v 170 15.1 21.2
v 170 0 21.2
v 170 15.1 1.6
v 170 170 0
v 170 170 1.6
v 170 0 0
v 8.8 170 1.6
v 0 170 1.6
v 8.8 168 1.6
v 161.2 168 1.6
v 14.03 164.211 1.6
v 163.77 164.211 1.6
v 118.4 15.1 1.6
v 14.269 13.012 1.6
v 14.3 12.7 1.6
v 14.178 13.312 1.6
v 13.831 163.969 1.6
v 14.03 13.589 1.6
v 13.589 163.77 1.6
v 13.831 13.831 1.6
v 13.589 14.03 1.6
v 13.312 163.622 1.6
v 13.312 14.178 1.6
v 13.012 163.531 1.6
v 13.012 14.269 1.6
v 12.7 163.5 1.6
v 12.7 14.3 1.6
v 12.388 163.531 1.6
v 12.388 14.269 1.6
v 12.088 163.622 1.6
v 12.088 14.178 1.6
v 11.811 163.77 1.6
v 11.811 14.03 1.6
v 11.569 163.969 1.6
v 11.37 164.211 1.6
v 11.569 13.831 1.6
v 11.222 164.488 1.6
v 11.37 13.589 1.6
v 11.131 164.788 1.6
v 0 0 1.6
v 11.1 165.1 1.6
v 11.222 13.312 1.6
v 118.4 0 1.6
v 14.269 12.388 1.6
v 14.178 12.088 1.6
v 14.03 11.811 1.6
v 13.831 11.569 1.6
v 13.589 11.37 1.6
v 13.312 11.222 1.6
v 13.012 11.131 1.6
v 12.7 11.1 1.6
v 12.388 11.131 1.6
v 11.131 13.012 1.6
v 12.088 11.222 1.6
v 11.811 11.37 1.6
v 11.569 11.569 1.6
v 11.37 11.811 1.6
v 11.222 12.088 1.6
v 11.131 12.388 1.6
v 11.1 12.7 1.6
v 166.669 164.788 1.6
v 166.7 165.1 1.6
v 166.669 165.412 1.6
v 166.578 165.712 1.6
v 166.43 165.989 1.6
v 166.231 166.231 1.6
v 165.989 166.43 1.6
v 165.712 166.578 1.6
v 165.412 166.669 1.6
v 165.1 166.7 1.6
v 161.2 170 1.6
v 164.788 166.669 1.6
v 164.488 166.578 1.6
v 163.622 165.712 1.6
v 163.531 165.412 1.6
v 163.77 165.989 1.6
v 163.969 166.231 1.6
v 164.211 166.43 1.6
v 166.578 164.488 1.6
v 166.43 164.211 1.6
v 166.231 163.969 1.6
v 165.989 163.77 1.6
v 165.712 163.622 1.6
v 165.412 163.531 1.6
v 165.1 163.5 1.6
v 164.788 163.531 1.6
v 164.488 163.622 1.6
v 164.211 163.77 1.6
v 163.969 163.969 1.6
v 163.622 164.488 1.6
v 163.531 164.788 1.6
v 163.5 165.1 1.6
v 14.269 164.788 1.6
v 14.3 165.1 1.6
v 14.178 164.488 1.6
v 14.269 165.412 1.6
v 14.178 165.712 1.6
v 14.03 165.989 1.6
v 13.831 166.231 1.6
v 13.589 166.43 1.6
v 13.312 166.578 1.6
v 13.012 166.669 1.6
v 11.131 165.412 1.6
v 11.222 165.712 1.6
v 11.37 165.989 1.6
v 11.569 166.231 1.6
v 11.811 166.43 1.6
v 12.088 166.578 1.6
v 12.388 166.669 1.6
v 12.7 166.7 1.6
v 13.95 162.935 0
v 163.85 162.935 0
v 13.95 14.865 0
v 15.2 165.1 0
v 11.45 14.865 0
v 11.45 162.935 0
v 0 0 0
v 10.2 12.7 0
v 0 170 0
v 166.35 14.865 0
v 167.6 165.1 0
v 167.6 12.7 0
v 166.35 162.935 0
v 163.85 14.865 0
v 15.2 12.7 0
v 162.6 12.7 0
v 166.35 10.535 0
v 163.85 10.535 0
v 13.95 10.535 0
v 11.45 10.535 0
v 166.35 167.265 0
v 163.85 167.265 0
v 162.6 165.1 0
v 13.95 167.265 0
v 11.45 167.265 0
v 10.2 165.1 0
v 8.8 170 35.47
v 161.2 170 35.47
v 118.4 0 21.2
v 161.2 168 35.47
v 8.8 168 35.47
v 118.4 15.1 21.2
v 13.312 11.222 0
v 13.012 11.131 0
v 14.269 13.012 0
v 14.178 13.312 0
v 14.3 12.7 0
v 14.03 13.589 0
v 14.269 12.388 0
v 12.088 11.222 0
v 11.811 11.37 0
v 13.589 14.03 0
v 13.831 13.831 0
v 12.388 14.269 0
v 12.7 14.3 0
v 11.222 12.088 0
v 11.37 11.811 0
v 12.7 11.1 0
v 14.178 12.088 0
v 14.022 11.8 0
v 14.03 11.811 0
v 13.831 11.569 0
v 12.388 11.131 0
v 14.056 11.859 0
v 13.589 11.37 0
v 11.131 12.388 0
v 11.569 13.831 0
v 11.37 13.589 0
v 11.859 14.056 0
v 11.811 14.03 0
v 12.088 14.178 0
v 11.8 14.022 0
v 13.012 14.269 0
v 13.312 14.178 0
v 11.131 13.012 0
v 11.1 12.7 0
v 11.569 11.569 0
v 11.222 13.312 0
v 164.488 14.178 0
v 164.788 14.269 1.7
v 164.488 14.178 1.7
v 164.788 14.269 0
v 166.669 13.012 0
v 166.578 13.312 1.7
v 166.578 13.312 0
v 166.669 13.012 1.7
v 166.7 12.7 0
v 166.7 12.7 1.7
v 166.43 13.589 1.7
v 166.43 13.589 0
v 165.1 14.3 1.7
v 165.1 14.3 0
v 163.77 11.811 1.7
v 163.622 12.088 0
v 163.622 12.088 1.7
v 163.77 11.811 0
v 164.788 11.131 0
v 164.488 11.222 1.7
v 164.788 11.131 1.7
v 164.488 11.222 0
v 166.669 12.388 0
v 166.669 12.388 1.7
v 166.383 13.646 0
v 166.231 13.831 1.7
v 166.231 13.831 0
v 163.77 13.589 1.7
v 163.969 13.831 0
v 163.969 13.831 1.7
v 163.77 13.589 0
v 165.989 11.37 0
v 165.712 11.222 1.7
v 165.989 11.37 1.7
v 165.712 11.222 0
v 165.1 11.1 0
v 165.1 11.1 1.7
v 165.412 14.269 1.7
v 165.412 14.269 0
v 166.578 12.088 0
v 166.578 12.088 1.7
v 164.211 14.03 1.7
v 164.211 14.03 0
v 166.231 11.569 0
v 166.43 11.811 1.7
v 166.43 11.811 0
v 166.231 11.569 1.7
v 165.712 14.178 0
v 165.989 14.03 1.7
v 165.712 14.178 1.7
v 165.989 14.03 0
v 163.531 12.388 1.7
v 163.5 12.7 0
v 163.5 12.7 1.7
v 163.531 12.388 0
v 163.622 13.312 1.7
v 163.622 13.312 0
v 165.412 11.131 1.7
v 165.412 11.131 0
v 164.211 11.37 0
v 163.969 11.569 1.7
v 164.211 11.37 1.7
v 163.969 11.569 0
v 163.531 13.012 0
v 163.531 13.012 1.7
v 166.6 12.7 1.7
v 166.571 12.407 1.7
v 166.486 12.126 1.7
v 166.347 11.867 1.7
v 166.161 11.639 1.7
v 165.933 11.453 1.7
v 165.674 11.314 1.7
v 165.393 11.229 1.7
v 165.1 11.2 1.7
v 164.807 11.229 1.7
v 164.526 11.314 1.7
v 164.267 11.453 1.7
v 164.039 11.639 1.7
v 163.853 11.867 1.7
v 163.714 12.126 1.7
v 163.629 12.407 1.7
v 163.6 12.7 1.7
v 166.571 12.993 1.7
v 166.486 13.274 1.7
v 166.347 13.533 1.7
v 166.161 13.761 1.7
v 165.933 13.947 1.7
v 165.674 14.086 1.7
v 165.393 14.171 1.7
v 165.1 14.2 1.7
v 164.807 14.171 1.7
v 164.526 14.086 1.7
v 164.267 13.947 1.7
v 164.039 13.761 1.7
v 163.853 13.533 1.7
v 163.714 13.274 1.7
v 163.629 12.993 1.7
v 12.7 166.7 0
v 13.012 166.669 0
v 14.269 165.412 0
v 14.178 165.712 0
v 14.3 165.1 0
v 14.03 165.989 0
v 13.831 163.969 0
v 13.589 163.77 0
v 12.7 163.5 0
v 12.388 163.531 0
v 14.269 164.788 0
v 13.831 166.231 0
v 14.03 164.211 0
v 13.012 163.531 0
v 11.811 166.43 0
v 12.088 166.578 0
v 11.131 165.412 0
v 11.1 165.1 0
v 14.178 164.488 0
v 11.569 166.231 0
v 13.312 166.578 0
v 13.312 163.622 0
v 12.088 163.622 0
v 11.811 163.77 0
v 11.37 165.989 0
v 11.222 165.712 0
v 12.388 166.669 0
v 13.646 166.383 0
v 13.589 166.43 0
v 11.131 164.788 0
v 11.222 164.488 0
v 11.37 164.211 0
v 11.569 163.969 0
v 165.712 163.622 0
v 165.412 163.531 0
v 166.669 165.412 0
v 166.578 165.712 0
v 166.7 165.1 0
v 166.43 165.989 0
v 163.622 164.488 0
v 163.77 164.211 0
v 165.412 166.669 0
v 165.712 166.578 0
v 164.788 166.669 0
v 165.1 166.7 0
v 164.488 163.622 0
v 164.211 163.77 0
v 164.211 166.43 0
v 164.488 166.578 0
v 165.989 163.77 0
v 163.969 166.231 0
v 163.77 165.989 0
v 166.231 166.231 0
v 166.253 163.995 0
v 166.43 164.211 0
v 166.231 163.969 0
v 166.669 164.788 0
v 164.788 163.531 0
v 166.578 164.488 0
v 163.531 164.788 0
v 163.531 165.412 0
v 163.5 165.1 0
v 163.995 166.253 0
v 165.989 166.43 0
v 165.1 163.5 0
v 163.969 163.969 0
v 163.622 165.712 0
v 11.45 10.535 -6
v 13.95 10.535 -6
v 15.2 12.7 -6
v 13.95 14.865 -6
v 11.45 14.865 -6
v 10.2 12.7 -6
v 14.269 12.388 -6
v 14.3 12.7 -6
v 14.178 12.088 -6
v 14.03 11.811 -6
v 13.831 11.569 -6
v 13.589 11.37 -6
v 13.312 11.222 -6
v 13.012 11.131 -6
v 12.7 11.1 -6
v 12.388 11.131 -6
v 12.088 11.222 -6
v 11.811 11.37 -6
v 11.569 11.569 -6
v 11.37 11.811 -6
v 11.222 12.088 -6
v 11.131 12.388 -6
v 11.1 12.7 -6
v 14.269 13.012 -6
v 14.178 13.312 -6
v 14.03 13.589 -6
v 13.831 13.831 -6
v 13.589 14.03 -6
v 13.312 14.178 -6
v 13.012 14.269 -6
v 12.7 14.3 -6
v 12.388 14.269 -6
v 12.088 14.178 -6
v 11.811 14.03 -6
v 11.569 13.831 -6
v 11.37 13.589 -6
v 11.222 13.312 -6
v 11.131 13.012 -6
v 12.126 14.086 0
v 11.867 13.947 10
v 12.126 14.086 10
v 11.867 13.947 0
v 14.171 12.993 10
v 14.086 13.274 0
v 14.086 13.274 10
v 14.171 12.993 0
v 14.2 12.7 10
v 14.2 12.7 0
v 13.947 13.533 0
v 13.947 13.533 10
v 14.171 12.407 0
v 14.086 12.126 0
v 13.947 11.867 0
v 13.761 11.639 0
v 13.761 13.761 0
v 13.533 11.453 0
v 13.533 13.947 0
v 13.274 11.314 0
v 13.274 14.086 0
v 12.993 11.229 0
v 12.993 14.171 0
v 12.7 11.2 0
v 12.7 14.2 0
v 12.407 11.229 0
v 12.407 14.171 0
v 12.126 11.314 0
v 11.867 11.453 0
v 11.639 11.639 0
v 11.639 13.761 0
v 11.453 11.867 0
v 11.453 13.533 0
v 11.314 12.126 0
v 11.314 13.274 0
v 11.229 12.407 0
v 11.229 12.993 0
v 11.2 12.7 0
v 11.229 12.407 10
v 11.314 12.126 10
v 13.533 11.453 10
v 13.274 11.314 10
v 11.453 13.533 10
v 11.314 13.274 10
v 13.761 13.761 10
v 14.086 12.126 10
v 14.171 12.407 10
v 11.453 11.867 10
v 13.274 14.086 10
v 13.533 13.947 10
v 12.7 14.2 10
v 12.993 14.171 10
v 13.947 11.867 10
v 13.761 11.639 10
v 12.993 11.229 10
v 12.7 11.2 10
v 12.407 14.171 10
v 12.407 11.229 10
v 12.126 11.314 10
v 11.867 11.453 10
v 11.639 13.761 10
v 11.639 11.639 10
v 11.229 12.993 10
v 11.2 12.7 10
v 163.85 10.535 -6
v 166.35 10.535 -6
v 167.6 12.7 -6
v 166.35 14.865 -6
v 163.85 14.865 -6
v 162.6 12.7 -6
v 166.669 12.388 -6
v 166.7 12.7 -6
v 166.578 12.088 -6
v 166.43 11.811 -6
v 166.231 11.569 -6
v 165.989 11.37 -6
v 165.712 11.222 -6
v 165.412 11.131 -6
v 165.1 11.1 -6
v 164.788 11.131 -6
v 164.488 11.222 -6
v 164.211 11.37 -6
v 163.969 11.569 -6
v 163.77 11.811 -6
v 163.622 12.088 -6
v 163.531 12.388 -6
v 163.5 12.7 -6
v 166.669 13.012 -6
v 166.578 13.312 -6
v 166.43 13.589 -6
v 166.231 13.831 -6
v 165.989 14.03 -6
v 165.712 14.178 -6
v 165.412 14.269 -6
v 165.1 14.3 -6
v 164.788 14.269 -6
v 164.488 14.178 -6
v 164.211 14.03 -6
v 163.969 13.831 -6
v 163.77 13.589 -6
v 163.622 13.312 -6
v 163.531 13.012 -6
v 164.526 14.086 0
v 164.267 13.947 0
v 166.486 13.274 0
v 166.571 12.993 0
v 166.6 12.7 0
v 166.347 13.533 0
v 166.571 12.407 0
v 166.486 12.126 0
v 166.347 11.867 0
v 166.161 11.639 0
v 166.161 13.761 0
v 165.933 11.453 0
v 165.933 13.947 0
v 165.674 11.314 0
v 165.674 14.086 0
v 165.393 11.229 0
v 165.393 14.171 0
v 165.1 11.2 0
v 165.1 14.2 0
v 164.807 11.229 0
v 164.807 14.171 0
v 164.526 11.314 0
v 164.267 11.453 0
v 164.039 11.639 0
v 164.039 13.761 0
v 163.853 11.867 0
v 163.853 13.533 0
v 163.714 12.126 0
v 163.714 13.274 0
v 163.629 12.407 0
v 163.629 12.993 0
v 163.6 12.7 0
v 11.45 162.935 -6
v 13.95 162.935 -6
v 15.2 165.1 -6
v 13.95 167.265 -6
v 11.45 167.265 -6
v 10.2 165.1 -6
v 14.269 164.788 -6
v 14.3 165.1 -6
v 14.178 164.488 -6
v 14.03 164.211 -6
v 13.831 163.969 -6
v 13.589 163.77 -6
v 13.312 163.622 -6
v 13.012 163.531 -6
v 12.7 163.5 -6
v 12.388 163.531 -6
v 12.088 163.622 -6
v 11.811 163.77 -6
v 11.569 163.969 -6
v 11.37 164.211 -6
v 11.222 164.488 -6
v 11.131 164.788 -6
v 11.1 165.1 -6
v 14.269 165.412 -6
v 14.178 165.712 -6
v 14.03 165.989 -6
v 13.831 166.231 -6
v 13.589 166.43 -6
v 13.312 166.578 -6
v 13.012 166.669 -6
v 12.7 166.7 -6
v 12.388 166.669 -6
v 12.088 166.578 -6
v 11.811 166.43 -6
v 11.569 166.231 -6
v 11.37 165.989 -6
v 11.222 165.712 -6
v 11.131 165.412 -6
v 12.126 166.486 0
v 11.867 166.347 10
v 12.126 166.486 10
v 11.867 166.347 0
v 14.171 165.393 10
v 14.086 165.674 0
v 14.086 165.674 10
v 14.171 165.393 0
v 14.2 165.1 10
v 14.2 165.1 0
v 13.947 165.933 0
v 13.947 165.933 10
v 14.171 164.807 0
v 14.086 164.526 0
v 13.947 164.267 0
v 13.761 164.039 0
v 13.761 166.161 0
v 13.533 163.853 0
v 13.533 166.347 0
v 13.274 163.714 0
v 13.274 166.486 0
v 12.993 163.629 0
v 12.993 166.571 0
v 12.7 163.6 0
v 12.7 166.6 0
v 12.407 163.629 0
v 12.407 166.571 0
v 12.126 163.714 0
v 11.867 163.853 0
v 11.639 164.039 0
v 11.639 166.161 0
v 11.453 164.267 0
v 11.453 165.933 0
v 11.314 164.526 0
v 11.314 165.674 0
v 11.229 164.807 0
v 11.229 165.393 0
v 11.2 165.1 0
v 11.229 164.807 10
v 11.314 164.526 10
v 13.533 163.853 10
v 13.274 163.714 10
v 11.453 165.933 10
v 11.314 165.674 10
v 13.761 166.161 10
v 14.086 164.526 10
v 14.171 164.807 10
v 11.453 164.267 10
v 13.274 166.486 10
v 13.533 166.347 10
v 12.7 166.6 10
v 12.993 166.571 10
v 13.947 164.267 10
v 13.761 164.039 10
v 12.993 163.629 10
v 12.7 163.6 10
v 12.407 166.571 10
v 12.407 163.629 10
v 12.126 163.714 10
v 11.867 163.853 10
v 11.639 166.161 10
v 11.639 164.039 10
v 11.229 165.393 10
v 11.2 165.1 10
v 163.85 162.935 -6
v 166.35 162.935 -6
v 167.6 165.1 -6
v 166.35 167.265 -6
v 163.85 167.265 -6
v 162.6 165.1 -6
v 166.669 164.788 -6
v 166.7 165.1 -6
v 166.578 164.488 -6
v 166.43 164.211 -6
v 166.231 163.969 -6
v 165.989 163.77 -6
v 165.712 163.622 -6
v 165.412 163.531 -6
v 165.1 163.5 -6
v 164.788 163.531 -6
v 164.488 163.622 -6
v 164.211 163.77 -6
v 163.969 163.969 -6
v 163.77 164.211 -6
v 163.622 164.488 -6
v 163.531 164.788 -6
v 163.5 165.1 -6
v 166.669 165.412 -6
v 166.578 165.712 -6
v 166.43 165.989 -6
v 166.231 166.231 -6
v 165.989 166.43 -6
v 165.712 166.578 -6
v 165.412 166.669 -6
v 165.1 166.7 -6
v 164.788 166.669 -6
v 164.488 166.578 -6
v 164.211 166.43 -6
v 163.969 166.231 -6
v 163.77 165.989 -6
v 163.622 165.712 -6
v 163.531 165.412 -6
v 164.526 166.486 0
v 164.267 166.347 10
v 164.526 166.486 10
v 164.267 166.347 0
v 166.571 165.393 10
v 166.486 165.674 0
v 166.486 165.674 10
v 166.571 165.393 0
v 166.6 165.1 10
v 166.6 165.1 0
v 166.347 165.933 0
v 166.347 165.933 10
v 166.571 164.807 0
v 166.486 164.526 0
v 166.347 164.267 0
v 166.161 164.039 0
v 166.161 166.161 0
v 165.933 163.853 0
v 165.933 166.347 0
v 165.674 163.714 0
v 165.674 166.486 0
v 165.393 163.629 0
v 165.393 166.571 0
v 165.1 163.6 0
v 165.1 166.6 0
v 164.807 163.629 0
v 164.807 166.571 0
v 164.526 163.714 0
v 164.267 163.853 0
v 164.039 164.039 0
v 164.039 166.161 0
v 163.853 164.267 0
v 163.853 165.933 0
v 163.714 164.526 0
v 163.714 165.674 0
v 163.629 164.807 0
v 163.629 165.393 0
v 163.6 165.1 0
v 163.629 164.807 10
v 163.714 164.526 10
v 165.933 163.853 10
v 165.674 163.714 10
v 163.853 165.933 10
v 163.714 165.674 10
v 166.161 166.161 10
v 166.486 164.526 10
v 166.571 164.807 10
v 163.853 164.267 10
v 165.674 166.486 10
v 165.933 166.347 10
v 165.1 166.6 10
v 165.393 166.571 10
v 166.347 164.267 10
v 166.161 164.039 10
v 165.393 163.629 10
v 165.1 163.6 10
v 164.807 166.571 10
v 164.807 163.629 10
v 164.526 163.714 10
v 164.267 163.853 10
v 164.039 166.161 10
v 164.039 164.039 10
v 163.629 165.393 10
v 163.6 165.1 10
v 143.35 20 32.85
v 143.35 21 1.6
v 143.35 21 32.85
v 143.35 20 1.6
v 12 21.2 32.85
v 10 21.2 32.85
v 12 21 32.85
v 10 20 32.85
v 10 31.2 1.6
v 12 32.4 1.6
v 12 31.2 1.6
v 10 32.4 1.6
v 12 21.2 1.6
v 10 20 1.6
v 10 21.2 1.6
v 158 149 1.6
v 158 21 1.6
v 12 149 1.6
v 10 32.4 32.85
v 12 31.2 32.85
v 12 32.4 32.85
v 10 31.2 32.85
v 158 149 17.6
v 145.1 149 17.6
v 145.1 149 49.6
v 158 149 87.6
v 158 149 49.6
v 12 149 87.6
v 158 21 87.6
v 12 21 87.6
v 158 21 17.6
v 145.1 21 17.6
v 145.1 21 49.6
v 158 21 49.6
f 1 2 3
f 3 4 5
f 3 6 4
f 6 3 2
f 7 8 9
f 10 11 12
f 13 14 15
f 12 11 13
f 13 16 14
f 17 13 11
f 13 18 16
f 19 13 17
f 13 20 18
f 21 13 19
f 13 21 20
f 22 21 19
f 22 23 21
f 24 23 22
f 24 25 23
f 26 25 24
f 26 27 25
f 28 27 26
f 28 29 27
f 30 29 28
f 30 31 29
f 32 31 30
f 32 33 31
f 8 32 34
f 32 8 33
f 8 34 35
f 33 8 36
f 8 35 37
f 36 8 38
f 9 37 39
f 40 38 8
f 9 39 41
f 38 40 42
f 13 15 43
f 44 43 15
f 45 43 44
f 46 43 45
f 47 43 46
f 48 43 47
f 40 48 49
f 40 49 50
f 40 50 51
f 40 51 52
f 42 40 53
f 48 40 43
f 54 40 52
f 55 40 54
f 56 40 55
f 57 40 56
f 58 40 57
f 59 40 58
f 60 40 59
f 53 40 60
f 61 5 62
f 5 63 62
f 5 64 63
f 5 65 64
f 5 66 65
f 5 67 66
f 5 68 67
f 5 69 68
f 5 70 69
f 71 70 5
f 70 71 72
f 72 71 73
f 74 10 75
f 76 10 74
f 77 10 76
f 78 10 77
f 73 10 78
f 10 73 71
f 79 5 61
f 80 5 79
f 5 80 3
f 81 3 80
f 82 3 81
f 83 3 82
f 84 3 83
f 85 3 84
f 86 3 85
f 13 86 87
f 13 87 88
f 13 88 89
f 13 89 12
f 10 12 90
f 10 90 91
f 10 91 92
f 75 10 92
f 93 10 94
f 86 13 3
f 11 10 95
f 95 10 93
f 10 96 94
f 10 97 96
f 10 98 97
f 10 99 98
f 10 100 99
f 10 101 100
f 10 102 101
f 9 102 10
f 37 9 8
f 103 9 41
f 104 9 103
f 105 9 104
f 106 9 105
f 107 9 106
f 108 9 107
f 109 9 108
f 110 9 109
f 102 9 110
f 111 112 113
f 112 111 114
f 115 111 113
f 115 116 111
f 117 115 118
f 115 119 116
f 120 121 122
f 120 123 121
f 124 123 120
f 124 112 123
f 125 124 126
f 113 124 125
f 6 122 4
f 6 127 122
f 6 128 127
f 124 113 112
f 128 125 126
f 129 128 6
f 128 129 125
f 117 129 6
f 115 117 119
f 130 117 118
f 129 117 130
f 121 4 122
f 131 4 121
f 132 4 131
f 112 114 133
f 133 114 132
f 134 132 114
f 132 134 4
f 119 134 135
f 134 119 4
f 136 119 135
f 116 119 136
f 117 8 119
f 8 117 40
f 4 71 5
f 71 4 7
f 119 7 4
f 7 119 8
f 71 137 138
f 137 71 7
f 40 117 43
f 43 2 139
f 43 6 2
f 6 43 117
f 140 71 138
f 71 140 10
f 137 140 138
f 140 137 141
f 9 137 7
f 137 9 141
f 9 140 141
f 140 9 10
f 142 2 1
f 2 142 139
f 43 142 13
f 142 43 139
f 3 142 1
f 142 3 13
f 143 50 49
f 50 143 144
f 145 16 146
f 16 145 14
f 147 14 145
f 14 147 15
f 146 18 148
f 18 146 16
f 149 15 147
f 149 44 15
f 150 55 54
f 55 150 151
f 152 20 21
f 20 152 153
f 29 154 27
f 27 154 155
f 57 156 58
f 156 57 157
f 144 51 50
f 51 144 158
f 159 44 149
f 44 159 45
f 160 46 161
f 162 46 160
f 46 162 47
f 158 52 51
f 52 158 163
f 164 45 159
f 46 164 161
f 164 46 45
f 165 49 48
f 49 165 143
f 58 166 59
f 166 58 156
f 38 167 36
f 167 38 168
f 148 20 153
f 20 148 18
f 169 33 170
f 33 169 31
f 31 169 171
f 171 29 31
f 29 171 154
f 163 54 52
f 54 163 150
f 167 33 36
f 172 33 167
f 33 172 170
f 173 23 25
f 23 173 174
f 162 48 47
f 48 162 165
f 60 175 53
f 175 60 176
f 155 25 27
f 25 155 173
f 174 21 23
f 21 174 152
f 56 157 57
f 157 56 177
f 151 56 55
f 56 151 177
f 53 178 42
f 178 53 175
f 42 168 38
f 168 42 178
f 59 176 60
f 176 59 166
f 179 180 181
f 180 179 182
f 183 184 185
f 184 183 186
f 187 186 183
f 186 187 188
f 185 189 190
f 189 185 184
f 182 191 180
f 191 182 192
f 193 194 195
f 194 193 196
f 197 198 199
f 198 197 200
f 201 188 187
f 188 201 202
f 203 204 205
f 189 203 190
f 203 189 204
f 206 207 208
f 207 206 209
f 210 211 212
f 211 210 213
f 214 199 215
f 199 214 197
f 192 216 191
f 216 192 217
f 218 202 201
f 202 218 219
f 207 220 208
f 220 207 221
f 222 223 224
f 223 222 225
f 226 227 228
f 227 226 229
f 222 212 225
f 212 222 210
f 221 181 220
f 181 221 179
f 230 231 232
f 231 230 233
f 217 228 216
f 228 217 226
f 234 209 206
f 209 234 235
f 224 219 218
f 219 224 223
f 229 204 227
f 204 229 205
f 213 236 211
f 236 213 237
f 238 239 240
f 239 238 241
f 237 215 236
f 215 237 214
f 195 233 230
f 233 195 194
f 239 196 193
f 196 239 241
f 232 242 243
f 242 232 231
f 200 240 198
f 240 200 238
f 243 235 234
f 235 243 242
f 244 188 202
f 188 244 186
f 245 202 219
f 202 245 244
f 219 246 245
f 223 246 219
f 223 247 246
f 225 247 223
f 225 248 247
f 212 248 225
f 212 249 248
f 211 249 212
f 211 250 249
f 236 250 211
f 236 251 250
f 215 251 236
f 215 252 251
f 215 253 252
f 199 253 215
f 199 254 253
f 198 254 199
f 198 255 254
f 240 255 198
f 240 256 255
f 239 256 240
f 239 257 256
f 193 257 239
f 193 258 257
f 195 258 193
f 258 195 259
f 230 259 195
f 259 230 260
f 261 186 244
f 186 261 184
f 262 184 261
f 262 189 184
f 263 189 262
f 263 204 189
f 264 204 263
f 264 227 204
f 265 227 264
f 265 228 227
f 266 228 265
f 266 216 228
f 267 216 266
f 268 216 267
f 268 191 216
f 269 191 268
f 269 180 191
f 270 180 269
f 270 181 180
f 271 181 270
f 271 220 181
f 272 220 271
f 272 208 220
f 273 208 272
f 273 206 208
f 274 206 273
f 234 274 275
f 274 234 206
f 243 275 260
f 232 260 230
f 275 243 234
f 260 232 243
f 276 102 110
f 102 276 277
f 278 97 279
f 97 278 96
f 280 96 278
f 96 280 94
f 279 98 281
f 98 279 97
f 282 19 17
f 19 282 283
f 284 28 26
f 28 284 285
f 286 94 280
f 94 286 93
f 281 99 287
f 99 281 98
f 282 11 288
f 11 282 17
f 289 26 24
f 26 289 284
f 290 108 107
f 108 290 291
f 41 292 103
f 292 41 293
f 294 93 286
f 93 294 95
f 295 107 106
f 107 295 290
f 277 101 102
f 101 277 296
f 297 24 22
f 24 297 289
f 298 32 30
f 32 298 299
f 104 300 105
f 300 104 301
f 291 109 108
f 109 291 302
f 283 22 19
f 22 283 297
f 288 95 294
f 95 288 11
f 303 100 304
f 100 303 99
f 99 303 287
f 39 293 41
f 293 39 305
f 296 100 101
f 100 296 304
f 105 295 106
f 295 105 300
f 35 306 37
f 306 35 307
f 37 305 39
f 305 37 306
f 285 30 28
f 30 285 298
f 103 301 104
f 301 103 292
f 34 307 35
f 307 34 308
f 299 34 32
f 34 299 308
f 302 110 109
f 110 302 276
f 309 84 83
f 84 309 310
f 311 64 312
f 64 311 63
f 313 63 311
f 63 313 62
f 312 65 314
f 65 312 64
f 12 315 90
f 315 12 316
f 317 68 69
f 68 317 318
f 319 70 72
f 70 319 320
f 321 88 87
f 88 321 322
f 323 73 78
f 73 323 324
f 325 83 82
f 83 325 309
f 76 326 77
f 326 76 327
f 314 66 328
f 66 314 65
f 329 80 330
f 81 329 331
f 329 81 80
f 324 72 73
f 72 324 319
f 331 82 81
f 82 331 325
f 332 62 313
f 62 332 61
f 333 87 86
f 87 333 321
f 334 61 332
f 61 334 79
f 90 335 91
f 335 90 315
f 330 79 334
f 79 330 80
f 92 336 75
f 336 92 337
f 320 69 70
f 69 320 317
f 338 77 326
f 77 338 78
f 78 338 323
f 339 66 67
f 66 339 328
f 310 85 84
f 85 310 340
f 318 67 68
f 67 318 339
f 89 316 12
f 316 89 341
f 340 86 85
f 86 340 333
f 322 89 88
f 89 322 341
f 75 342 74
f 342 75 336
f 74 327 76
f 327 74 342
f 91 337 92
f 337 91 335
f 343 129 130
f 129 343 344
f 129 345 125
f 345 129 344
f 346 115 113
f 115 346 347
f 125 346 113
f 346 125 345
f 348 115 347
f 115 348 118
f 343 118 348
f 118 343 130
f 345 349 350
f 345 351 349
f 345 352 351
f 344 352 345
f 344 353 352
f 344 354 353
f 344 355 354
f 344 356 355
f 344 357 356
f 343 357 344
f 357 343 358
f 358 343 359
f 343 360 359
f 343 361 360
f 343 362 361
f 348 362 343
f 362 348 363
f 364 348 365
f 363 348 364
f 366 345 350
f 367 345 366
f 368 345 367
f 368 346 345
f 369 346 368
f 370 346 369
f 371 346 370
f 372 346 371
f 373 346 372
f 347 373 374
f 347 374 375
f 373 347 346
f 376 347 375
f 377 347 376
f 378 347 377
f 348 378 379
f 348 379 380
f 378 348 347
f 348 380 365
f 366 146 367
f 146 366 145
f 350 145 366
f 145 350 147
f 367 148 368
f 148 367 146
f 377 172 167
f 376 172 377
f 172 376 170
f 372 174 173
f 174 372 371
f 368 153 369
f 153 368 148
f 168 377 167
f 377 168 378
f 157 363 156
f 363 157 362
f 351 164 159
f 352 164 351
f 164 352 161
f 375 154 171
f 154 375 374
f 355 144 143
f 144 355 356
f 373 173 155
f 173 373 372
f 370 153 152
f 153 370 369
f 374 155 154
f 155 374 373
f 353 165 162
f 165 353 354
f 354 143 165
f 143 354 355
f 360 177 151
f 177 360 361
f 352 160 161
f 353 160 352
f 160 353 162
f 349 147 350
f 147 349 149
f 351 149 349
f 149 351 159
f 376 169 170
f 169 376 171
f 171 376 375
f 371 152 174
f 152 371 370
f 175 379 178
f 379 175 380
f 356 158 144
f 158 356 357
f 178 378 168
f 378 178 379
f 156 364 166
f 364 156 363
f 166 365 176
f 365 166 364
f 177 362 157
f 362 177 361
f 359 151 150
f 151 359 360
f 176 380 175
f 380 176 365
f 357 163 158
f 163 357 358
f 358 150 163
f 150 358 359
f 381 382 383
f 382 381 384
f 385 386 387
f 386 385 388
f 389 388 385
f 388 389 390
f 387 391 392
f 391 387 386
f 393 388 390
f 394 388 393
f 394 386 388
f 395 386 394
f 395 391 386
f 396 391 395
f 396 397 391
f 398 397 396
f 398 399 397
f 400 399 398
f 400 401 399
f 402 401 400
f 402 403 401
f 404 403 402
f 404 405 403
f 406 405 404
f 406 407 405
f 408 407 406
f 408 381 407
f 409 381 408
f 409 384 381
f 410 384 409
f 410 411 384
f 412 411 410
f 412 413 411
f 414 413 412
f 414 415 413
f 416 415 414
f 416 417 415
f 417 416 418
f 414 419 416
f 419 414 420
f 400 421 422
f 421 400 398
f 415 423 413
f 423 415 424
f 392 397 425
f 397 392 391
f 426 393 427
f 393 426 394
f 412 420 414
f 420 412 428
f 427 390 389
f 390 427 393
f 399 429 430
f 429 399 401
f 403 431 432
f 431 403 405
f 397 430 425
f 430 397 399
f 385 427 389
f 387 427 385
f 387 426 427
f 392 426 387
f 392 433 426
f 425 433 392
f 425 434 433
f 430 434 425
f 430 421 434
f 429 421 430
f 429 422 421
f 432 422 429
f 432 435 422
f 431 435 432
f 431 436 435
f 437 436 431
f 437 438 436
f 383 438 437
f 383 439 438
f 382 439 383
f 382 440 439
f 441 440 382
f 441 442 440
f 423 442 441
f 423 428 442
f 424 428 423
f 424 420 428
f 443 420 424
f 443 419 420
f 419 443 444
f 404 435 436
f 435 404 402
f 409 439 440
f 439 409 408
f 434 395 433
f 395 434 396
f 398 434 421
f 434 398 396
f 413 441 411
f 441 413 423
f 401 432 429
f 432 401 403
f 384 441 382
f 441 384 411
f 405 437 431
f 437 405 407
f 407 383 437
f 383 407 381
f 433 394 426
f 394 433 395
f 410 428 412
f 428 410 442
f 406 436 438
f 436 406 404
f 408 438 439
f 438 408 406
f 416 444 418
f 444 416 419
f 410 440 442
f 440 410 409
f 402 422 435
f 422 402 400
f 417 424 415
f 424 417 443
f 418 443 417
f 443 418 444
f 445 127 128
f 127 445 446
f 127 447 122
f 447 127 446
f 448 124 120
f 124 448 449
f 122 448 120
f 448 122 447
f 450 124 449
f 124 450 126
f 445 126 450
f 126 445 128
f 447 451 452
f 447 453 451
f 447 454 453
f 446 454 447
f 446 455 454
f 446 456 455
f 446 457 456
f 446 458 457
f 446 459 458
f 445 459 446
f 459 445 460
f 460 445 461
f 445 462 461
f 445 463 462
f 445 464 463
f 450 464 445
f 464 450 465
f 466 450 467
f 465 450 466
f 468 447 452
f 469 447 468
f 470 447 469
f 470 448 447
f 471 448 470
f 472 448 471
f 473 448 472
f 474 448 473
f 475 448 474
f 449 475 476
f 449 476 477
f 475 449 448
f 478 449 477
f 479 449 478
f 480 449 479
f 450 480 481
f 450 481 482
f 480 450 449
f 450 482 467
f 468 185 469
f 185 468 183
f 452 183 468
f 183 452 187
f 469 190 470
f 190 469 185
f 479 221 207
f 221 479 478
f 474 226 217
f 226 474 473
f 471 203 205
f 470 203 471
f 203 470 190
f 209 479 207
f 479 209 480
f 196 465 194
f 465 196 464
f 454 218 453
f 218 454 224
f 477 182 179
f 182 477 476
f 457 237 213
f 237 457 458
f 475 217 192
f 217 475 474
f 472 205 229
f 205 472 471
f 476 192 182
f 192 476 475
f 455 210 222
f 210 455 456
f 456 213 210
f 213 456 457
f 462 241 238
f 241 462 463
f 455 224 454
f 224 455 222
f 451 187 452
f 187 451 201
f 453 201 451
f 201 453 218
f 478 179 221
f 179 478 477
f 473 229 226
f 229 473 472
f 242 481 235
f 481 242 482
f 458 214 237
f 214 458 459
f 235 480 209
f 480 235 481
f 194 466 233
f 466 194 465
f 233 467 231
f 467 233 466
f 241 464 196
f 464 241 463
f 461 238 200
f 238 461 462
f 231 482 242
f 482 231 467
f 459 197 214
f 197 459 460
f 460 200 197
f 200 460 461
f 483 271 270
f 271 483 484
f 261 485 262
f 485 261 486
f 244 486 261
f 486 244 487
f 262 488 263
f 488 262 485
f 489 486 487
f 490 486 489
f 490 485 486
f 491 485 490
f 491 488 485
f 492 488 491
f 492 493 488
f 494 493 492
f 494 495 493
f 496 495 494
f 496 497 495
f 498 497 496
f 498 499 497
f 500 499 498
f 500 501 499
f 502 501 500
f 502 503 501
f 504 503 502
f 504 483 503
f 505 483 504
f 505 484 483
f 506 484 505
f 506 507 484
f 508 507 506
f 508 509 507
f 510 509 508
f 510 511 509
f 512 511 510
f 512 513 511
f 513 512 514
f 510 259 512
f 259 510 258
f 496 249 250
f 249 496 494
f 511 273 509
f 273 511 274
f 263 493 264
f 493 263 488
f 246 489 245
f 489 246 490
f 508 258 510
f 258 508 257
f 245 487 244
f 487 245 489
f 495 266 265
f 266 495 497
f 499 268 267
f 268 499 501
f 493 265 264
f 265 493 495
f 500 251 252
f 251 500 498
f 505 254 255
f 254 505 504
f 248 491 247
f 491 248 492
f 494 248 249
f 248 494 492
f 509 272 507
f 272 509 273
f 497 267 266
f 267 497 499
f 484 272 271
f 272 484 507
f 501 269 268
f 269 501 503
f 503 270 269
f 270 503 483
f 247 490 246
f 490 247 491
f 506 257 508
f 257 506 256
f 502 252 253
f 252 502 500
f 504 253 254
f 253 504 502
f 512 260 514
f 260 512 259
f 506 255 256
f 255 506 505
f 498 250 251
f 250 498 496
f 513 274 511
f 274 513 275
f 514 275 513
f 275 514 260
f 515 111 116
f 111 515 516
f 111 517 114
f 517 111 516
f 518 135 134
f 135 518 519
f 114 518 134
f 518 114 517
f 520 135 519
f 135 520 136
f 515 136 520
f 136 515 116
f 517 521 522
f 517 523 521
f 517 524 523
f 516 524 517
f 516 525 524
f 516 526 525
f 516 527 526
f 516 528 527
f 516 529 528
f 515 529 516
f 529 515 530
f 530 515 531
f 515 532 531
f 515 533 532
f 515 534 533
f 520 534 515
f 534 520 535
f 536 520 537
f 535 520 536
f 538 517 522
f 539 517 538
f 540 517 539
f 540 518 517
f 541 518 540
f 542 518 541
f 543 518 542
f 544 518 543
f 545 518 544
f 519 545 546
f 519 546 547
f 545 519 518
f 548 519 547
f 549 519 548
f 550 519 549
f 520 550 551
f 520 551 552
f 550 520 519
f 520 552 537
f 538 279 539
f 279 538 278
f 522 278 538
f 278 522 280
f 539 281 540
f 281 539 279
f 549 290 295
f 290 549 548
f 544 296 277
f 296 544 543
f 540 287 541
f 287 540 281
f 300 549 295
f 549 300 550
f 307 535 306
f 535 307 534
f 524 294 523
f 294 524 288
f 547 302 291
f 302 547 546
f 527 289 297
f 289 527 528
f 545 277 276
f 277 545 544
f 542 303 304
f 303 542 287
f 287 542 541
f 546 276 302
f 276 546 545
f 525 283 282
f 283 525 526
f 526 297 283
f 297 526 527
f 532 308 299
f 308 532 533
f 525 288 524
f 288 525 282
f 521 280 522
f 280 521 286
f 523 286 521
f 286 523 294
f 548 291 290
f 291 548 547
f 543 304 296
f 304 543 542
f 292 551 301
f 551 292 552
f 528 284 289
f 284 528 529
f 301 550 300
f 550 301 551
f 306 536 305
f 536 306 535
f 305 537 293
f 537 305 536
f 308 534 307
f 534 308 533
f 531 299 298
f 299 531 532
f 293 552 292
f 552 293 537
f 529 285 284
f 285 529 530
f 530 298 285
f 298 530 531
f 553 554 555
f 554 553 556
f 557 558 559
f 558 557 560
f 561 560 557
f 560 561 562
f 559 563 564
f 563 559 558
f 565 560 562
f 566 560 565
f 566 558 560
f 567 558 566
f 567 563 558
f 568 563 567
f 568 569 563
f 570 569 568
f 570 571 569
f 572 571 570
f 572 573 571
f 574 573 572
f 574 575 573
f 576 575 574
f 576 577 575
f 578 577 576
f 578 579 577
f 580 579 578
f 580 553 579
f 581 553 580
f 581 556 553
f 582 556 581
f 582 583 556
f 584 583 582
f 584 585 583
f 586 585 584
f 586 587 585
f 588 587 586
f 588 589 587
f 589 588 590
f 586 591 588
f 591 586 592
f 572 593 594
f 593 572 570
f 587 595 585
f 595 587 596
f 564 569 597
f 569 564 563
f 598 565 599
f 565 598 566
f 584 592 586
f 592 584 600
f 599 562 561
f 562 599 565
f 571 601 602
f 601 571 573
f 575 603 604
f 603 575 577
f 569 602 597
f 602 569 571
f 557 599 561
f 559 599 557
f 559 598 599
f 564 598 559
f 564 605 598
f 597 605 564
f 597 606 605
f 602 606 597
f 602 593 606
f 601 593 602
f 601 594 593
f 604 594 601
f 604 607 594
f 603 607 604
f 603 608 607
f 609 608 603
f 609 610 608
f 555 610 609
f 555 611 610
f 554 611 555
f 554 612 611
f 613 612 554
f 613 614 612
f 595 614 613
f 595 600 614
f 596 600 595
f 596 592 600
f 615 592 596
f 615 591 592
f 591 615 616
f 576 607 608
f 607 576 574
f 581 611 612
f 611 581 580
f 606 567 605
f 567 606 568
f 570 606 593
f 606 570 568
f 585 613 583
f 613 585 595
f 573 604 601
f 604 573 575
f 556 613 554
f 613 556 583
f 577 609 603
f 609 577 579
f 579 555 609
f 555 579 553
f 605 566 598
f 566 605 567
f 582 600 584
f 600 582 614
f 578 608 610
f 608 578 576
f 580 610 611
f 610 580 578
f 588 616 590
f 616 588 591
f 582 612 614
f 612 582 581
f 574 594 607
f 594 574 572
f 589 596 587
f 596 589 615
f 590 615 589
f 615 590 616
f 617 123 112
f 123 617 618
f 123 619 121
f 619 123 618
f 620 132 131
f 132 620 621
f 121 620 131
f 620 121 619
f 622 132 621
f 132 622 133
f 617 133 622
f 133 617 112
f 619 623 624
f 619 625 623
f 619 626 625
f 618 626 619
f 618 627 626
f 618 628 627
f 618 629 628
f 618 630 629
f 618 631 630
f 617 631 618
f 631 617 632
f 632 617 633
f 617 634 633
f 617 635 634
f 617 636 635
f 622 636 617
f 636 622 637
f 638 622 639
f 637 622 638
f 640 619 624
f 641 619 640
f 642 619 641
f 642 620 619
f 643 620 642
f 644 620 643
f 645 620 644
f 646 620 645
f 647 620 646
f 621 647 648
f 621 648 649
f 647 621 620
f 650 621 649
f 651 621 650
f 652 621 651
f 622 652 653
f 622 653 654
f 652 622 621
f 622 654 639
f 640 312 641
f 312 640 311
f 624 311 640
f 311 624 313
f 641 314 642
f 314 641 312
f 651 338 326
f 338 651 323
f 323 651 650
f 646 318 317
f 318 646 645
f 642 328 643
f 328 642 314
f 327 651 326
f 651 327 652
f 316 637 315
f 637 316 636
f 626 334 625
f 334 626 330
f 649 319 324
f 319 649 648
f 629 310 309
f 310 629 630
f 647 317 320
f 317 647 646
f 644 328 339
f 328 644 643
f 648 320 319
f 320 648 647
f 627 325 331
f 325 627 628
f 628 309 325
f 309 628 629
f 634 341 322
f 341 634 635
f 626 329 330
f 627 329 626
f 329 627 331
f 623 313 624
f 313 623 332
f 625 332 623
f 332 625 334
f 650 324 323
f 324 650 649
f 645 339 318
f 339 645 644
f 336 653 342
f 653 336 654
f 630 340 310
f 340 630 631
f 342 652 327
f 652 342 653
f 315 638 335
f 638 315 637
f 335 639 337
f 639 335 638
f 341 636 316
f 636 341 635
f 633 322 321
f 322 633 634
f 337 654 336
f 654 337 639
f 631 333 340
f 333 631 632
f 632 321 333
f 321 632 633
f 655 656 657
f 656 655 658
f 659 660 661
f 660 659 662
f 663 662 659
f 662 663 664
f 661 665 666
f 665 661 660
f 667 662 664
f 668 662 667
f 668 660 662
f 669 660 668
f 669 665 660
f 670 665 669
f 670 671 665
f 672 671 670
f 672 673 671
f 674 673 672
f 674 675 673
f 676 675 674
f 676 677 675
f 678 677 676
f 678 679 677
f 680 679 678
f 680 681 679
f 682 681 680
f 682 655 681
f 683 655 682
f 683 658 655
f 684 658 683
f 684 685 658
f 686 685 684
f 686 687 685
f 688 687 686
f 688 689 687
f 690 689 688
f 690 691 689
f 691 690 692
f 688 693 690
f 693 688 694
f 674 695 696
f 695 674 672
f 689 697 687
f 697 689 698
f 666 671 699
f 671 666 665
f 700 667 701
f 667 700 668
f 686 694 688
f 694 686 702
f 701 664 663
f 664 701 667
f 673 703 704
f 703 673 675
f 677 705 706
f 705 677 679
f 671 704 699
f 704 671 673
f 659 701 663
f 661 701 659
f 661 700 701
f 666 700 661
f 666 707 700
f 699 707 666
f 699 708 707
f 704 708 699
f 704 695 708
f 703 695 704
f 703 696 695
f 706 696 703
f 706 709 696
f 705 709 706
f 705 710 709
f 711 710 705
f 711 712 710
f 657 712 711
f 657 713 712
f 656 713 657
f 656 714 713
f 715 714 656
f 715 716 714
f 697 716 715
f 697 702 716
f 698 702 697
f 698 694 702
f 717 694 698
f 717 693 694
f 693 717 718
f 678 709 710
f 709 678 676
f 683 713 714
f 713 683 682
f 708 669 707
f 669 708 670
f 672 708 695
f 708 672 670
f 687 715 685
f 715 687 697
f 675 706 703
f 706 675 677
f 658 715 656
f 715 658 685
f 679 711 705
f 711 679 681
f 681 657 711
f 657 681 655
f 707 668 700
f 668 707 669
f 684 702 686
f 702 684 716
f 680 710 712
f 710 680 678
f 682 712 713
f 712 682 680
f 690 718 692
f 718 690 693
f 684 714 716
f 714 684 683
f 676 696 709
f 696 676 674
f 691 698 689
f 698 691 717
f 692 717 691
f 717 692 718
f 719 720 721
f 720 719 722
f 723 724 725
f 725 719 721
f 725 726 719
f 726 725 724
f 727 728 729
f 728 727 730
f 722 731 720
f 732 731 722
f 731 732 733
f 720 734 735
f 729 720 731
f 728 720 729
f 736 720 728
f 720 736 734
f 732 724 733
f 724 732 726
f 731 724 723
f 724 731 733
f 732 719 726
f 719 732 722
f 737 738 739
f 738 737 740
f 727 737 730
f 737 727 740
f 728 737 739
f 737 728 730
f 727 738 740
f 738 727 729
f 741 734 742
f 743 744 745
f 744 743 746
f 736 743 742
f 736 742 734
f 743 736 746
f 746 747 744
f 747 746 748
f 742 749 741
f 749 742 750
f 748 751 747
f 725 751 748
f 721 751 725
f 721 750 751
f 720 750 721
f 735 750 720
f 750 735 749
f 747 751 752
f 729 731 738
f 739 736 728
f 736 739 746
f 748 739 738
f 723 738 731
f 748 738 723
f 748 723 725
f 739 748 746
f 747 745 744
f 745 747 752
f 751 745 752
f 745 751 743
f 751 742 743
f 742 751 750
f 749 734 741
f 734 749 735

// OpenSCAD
// file: ../../case/frame/standoff_extended.scad
// Extended Standoff - M3x10+6mm Male-Female
// Used for Open Air Frame mounting system
// 6mm female thread below (accepts motherboard mounting screw)
// 10mm male stud above (frame cylinders screw onto this)

include <../dimensions.scad>

// --- Extended Standoff Dimensions ---
extended_standoff_female_height = 6;      // Female portion height (below mobo)
extended_standoff_male_height = 10;       // Male stud height (above mobo)
extended_standoff_outer_diameter = 5;     // Outer diameter of standoff body
extended_standoff_thread_diameter = 3;    // M3 thread diameter
extended_standoff_thread_clearance = 3.2; // M3 clearance hole

// Brass color
brass_color = [0.71, 0.65, 0.26];

// --- Module: Extended Standoff ---
// Creates a single M3x10+6mm male-female standoff
module extended_standoff() {
    color(brass_color) {
        // Female portion (below motherboard)
        difference() {
            cylinder(h=extended_standoff_female_height, d=extended_standoff_outer_diameter, $fn=6);
            // Female thread hole (for screw from below)
            translate([0, 0, -0.1])
                cylinder(h=extended_standoff_female_height + 0.2, d=extended_standoff_thread_clearance, $fn=32);
        }

        // Male stud (above motherboard)
        translate([0, 0, extended_standoff_female_height])
            cylinder(h=extended_standoff_male_height, d=extended_standoff_thread_diameter, $fn=32);
    }
}

// --- Module: Extended Standoffs at Mini-ITX locations ---
// Places extended standoffs at all 4 Mini-ITX mounting positions
module extended_standoffs() {
    for (pos = standoff_locations) {
        translate([pos[0], pos[1], 0])
            extended_standoff();
    }
}

// Preview
extended_standoff();
// file: ../../case/dimensions.scad
// Shared dimensions for all case components
// This file defines common parameters used across multiple case parts

// --- Wall and Material ---
wall_thickness = 3;

// --- Motherboard (Mini-ITX) ---
mobo_width = 170;
mobo_depth = 170;
mobo_pcb_thickness = 1.6;

// --- Standoffs ---
standoff_height = 6;
standoff_hole_radius = 1.6;  // M3 clearance
standoff_locations = [
    [12.7, 12.7],
    [165.1, 12.7],
    [12.7, 165.1],
    [165.1, 165.1]
];

// --- I/O Shield ---
// Standard ATX I/O shield dimensions
io_shield_width = 158.75;   // 6.25 inches (standard ATX)
io_shield_height = 44.45;   // 1.75 inches (standard ATX)
io_shield_x_offset = (mobo_width - io_shield_width) / 2;
io_shield_z_offset = 5;     // 5mm from bottom of plate

// --- Backplate ---
backplate_height = 88.9;    // 3.5 inches
backplate_thickness = wall_thickness;

// --- CPU Cooler (Noctua NH-L12S) ---
cooler_width = 128;
cooler_depth = 146;
cooler_base_height = 35;      // Base plate and heatpipes
cooler_fan_height = 15;       // 120mm x 15mm fan (NF-A12x15)
cooler_fins_height = 20;      // Heatsink fins on top
cooler_total_height = cooler_base_height + cooler_fan_height + cooler_fins_height;  // 70mm

// --- Power Supplies ---
// Flex ATX (from technical drawing)
// Standing orientation: 40mm wide (X), 150mm deep (Y), 80mm tall (Z)
flex_atx_width = 40.0;      // A: Width (X - thin side, standing)
flex_atx_length = 150.0;    // B: Length (Y - depth)
flex_atx_height = 80.0;     // G: Height (Z - tall side, standing)

// Flex ATX Mounting holes - 8-32 UNC thread (4 places on rear 40x80mm face)
flex_atx_mount_hole_radius = 2.1;   // 8-32 clearance (~4.2mm dia)
flex_atx_mount_x_inset = 5;         // Distance from left/right edges (corrected from 12.5)
flex_atx_mount_z_inset = 5;         // Distance from top/bottom edges (corrected from 8.25)

// Calculated mounting hole positions (X, Z pairs relative to PSU origin)
// Note: Only 3 holes - top-right (coords) removed where C14 inlet is located
// When viewing from back: top-right (coords) = top-left (view)
flex_atx_mount_holes = [
    [flex_atx_mount_x_inset, flex_atx_mount_z_inset],                                    // Bottom-left (coords) = Bottom-right (view)
    [flex_atx_width - flex_atx_mount_x_inset, flex_atx_mount_z_inset],                   // Bottom-right (coords) = Bottom-left (view)
    [flex_atx_mount_x_inset, flex_atx_height - flex_atx_mount_z_inset]                   // Top-left (coords) = Top-right (view)
    // Top-right (coords) removed - C14 power inlet is here = Top-left (view)
];

// SFX
sfx_length = 125;
sfx_width = 100;
sfx_height = 63.5;

// --- HDD 3.5" Dimensions ---
hdd_width = 101.6;
hdd_length = 147;
hdd_height = 26.1;

// --- NAS 2-Disk Config ---
// 2 HDDs side-by-side (controlling dimension for case width)
// See SPEC.md Section 3.3 for design rationale
nas_2disk_rail_width = 2;
nas_2disk_gap = 5;           // Gap between bays
nas_2disk_padding = 2;       // Clearance around HDDs
nas_2disk_bay_width = hdd_width + 2 * nas_2disk_rail_width;  // ~105.6mm per bay
nas_2disk_inner_width = 2 * nas_2disk_bay_width + nas_2disk_gap;  // ~216.2mm
nas_2disk_width = nas_2disk_inner_width + 2 * (wall_thickness + nas_2disk_padding);  // ~226mm

// --- PSU Compartment ---
// Flex ATX PSU in standing orientation (40mm width)
flex_atx_standing_width = flex_atx_width;  // 40mm (already in standing orientation)
psu_compartment_width = nas_2disk_width - mobo_width;  // ~56mm (40mm PSU + 16mm clearance)

// --- Interior Chamber Height (standoffs + motherboard + cooler) ---
interior_chamber_height = standoff_height + mobo_pcb_thickness + cooler_total_height;  // ~94mm

// --- Minimal Config External Dimensions ---
// Motherboard area only (without PSU)
minimal_mobo_exterior_width = mobo_width + 2 * wall_thickness;   // 176mm
minimal_mobo_exterior_depth = mobo_depth + 2 * wall_thickness;   // 176mm
minimal_exterior_height = interior_chamber_height + 2 * wall_thickness;   // ~100mm

// With Flex ATX PSU next to motherboard
// Width controlled by NAS 2-disk HDD layout (see SPEC.md Section 3.3)
minimal_with_psu_width = nas_2disk_width;  // ~226mm (PSU compartment = 56mm, PSU on side = 40mm)

// --- Interior Panel Dimensions (top/bottom panels fit between walls) ---
interior_panel_width = minimal_with_psu_width - 2 * wall_thickness;  // ~220mm
interior_panel_depth = mobo_depth;                                    // 170mm

// --- Side Panel Dimensions (left/right panels form exterior walls) ---
side_panel_height = minimal_exterior_height;                          // ~100mm
side_panel_depth = mobo_depth + 2 * wall_thickness;                   // 176mm

// --- Front/Back Panel Dimensions (fit between side walls, full exterior height) ---
front_back_panel_width = interior_panel_width;                        // ~220mm
front_back_panel_height = side_panel_height;                          // ~100mm (full exterior)

// --- Ventilation ---
honeycomb_radius = 3;
vent_padding = 5;

// --- Screw Holes for Panel Assembly ---
panel_screw_radius = 1.6;  // M3
panel_screw_inset = 8;     // Distance from edge

// --- GPU ---
gpu_length = 320;          // Max GPU length
gpu_height = 140;          // GPU PCB + cooler height
gpu_width = 60;            // 3 slots

// --- GPU Config External Dimensions ---
// From SPEC.md Section 8.4
gpu_config_width = 171;    // mm
gpu_config_depth = 378;    // mm
gpu_config_height = 190;   // mm

// --- Fans ---
fan_120_size = 120;
fan_120_thickness = 25;
fan_140_size = 140;
fan_140_thickness = 25;

// --- AIO Radiator ---
radiator_240_length = 275;
radiator_240_width = 120;
radiator_240_thickness = 27;

// --- NAS Many-Disk Config ---
// 5-8 drives mounted vertically (on narrowest side)
nas_many_drive_count = 6;  // Default 6 drives
nas_many_drive_spacing = 5;
nas_many_enclosure_height = hdd_width + wall_thickness + 5;  // ~110mm (drives on side)

// --- Power Inlet C14 ---
c14_width = 50;
c14_height = 27;
c14_depth = 30;

// --- Open Air Frame ---
// Frame cylinder height (from motherboard surface to inside panel face)
// Derived: interior_chamber_height - standoff_height - mobo_pcb_thickness
frame_cylinder_height = interior_chamber_height - standoff_height - mobo_pcb_thickness;  // ~86mm
frame_cylinder_outer_diameter = 8;     // Outer diameter
frame_cylinder_inner_diameter = 3.2;   // M3 clearance for standoff stud
frame_cylinder_thread_depth = 10;      // Matches extended_standoff_male_height
// file: ../cpu_cooler.scad
// A module for the Noctua NH-L12S CPU cooler
// Fan mounted UNDER heatsink (closest to motherboard)
module noctua_nh_l12s() {
    heatsink_w = 128;
    heatsink_d = 146;
    heatsink_h = 70;

    fan_w = 128;
    fan_d = 146;
    fan_h = 16;

    // RAM cutout dimensions (in heatsink)
    ram_cutout_w = 134;
    ram_cutout_d = 13;
    ram_cutout_h = 32;

    union() {
        // Fan (at bottom, closest to motherboard)
        color("tan") {
            cube([fan_w, fan_d, fan_h]);
        }

        // Heatsink (on top of fan)
        color("silver") {
            translate([0, 0, fan_h]) {
                difference() {
                    cube([heatsink_w, heatsink_d, heatsink_h]);
                    // RAM Cutout (from bottom of heatsink)
                    translate([(heatsink_w - ram_cutout_w)/2, -0.1, 0]) {
                        cube([ram_cutout_w, ram_cutout_d, ram_cutout_h]);
                    }
                }
            }
        }
    }
}

// Preview
noctua_nh_l12s();
// file: ../ram.scad
// A module for a single DDR4 RAM stick
module ram_stick() {
    ram_l = 133.35;
    ram_h = 31.25;
    ram_t = 1.2;
    cube([ram_l, ram_t, ram_h]);
}
// file: ../motherboard.scad
// A module to create a rudimentary Mini-ITX motherboard model
// Includes mounting holes and standoffs at standard Mini-ITX positions

include <../case/dimensions.scad>
use <../case/frame/standoff_extended.scad>

module motherboard() {
    mobo_width = 170;
    mobo_depth = 170;
    mobo_thickness = 1.6;

    io_shield_width = 152.4;
    io_shield_height = 33.87;
    io_shield_thickness = 2;
    io_shield_x_offset = (mobo_width - io_shield_width) / 2;

    // ATX 24-pin connector dimensions
    atx_conn_l = 51.6;
    atx_conn_w = 15.1;
    atx_conn_h = 19.6;

    // Standoff positioning
    // Female portion sits below PCB, male stud extends up through hole
    standoff_female_h = 6;  // Height of female portion below PCB

    union() {
        // Motherboard PCB with mounting holes
        color("purple") {
            difference() {
                union() {
                    // Motherboard PCB
                    cube([mobo_width, mobo_depth, mobo_thickness]);
                    // I/O Shield
                    translate([io_shield_x_offset, mobo_depth - io_shield_thickness, mobo_thickness]) {
                        cube([io_shield_width, io_shield_thickness, io_shield_height]);
                    }
                    // 24-pin ATX Connector
                    translate([mobo_width - atx_conn_l, 0, mobo_thickness]) {
                        cube([atx_conn_l, atx_conn_w, atx_conn_h]);
                    }
                }
                // Mounting holes at Mini-ITX standoff locations
                for (pos = standoff_locations) {
                    translate([pos[0], pos[1], -0.1]) {
                        cylinder(h = mobo_thickness + 0.2, r = standoff_hole_radius, $fn = 32);
                    }
                }
            }
        }

        // Standoffs - positioned so female portion is below PCB
        // Male stud extends upward through the mounting holes
        for (pos = standoff_locations) {
            translate([pos[0], pos[1], -standoff_female_h]) {
                extended_standoff();
            }
        }
    }
}

// Preview
motherboard();
// main file
// Motherboard Assembly
// Combines motherboard with RAM and CPU cooler

use <../motherboard.scad>
use <../ram.scad>
use <../cpu_cooler.scad>

module motherboard_assembly() {
    mobo_thickness = 1.6;

    // DDR4 RAM positioning
    ram_t = 1.2;
    ram_spacing = 10;

    union() {
        // Bare motherboard
        motherboard();

        // RAM Sticks (2x DDR4)
        translate([10, 20, mobo_thickness]) {
            ram_stick();
            translate([0, ram_t + ram_spacing, 0]) {
                ram_stick();
            }
        }

        // CPU Cooler (Noctua NH-L12S)
        // Rotated 90° CCW, repositioned to stay over CPU area
        translate([158, 21, mobo_thickness]) {
            rotate([0, 0, 90]) {
                noctua_nh_l12s();
            }
        }
    }
}

// Preview
motherboard_assembly();
